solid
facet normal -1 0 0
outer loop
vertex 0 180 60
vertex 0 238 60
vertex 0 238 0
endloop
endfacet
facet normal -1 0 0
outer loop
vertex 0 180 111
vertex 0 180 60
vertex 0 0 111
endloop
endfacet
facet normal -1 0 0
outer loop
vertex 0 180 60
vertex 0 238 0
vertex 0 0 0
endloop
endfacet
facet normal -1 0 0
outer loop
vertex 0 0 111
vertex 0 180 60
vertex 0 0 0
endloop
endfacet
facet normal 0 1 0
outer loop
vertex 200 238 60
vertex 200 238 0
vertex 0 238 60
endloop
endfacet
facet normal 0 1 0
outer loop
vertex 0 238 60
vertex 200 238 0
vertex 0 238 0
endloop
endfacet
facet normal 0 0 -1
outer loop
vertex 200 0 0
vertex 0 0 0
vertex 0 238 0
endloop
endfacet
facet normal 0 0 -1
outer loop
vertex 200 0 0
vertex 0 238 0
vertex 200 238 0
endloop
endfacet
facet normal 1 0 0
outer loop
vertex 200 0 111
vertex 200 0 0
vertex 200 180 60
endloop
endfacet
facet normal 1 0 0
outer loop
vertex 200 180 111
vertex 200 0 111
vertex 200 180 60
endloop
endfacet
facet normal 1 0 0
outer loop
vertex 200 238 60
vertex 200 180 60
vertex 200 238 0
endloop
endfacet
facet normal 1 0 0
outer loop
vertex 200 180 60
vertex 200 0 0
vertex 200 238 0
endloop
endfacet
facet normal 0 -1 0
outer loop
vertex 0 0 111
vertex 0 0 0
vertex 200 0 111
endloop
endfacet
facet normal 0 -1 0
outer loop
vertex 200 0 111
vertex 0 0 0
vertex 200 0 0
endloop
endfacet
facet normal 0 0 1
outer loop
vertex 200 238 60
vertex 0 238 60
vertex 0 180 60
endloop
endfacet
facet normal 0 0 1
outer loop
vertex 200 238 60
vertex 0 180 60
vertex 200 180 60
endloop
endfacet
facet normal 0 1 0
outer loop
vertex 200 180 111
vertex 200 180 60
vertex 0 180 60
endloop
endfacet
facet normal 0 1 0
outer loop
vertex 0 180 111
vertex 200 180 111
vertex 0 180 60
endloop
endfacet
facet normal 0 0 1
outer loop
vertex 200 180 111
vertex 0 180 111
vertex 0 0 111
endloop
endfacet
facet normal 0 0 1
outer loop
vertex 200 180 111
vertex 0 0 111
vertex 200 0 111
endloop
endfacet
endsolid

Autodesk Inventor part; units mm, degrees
ref_plane "Plan YZ" through (0, 0, 0) normal (1, 0, 0) x (0, 1, 0)
ref_plane "Plan XZ" through (0, 0, 0) normal (0, 1, 0) x (-1, 0, 0)
ref_plane "Plan XY" through (0, 0, 0) normal (0, 0, 1) x (1, 0, 0)
sketch "Esquisse1" plane through (0, 0, 0) normal (0, 0, 1) x (1, 0, 0)
  line L0 (0, 0) -> (200, 0)
  line L1 (200, 0) -> (200, 238)
  line L2 (200, 238) -> (0, 238)
  line L3 (0, 238) -> (0, 0)
  line L4 (0, 0) -> (200, 0)
  line L5 (200, 0) -> (200, 180)
  line L6 (200, 180) -> (0, 180)
  line L7 (0, 180) -> (0, 0)
  point P0 (0, 180)
  dimension "d0" = 200
  dimension "d1" = 238
  dimension "d2" = 180
extrude "Extrusion1" add sketch "Esquisse1" along normal blind 111 contours L3 L6 L1 L0
extrude "Extrusion2" add sketch "Esquisse1" along normal blind 60 contours L3 L2 L1 L6
properties part number "coffretElec"
